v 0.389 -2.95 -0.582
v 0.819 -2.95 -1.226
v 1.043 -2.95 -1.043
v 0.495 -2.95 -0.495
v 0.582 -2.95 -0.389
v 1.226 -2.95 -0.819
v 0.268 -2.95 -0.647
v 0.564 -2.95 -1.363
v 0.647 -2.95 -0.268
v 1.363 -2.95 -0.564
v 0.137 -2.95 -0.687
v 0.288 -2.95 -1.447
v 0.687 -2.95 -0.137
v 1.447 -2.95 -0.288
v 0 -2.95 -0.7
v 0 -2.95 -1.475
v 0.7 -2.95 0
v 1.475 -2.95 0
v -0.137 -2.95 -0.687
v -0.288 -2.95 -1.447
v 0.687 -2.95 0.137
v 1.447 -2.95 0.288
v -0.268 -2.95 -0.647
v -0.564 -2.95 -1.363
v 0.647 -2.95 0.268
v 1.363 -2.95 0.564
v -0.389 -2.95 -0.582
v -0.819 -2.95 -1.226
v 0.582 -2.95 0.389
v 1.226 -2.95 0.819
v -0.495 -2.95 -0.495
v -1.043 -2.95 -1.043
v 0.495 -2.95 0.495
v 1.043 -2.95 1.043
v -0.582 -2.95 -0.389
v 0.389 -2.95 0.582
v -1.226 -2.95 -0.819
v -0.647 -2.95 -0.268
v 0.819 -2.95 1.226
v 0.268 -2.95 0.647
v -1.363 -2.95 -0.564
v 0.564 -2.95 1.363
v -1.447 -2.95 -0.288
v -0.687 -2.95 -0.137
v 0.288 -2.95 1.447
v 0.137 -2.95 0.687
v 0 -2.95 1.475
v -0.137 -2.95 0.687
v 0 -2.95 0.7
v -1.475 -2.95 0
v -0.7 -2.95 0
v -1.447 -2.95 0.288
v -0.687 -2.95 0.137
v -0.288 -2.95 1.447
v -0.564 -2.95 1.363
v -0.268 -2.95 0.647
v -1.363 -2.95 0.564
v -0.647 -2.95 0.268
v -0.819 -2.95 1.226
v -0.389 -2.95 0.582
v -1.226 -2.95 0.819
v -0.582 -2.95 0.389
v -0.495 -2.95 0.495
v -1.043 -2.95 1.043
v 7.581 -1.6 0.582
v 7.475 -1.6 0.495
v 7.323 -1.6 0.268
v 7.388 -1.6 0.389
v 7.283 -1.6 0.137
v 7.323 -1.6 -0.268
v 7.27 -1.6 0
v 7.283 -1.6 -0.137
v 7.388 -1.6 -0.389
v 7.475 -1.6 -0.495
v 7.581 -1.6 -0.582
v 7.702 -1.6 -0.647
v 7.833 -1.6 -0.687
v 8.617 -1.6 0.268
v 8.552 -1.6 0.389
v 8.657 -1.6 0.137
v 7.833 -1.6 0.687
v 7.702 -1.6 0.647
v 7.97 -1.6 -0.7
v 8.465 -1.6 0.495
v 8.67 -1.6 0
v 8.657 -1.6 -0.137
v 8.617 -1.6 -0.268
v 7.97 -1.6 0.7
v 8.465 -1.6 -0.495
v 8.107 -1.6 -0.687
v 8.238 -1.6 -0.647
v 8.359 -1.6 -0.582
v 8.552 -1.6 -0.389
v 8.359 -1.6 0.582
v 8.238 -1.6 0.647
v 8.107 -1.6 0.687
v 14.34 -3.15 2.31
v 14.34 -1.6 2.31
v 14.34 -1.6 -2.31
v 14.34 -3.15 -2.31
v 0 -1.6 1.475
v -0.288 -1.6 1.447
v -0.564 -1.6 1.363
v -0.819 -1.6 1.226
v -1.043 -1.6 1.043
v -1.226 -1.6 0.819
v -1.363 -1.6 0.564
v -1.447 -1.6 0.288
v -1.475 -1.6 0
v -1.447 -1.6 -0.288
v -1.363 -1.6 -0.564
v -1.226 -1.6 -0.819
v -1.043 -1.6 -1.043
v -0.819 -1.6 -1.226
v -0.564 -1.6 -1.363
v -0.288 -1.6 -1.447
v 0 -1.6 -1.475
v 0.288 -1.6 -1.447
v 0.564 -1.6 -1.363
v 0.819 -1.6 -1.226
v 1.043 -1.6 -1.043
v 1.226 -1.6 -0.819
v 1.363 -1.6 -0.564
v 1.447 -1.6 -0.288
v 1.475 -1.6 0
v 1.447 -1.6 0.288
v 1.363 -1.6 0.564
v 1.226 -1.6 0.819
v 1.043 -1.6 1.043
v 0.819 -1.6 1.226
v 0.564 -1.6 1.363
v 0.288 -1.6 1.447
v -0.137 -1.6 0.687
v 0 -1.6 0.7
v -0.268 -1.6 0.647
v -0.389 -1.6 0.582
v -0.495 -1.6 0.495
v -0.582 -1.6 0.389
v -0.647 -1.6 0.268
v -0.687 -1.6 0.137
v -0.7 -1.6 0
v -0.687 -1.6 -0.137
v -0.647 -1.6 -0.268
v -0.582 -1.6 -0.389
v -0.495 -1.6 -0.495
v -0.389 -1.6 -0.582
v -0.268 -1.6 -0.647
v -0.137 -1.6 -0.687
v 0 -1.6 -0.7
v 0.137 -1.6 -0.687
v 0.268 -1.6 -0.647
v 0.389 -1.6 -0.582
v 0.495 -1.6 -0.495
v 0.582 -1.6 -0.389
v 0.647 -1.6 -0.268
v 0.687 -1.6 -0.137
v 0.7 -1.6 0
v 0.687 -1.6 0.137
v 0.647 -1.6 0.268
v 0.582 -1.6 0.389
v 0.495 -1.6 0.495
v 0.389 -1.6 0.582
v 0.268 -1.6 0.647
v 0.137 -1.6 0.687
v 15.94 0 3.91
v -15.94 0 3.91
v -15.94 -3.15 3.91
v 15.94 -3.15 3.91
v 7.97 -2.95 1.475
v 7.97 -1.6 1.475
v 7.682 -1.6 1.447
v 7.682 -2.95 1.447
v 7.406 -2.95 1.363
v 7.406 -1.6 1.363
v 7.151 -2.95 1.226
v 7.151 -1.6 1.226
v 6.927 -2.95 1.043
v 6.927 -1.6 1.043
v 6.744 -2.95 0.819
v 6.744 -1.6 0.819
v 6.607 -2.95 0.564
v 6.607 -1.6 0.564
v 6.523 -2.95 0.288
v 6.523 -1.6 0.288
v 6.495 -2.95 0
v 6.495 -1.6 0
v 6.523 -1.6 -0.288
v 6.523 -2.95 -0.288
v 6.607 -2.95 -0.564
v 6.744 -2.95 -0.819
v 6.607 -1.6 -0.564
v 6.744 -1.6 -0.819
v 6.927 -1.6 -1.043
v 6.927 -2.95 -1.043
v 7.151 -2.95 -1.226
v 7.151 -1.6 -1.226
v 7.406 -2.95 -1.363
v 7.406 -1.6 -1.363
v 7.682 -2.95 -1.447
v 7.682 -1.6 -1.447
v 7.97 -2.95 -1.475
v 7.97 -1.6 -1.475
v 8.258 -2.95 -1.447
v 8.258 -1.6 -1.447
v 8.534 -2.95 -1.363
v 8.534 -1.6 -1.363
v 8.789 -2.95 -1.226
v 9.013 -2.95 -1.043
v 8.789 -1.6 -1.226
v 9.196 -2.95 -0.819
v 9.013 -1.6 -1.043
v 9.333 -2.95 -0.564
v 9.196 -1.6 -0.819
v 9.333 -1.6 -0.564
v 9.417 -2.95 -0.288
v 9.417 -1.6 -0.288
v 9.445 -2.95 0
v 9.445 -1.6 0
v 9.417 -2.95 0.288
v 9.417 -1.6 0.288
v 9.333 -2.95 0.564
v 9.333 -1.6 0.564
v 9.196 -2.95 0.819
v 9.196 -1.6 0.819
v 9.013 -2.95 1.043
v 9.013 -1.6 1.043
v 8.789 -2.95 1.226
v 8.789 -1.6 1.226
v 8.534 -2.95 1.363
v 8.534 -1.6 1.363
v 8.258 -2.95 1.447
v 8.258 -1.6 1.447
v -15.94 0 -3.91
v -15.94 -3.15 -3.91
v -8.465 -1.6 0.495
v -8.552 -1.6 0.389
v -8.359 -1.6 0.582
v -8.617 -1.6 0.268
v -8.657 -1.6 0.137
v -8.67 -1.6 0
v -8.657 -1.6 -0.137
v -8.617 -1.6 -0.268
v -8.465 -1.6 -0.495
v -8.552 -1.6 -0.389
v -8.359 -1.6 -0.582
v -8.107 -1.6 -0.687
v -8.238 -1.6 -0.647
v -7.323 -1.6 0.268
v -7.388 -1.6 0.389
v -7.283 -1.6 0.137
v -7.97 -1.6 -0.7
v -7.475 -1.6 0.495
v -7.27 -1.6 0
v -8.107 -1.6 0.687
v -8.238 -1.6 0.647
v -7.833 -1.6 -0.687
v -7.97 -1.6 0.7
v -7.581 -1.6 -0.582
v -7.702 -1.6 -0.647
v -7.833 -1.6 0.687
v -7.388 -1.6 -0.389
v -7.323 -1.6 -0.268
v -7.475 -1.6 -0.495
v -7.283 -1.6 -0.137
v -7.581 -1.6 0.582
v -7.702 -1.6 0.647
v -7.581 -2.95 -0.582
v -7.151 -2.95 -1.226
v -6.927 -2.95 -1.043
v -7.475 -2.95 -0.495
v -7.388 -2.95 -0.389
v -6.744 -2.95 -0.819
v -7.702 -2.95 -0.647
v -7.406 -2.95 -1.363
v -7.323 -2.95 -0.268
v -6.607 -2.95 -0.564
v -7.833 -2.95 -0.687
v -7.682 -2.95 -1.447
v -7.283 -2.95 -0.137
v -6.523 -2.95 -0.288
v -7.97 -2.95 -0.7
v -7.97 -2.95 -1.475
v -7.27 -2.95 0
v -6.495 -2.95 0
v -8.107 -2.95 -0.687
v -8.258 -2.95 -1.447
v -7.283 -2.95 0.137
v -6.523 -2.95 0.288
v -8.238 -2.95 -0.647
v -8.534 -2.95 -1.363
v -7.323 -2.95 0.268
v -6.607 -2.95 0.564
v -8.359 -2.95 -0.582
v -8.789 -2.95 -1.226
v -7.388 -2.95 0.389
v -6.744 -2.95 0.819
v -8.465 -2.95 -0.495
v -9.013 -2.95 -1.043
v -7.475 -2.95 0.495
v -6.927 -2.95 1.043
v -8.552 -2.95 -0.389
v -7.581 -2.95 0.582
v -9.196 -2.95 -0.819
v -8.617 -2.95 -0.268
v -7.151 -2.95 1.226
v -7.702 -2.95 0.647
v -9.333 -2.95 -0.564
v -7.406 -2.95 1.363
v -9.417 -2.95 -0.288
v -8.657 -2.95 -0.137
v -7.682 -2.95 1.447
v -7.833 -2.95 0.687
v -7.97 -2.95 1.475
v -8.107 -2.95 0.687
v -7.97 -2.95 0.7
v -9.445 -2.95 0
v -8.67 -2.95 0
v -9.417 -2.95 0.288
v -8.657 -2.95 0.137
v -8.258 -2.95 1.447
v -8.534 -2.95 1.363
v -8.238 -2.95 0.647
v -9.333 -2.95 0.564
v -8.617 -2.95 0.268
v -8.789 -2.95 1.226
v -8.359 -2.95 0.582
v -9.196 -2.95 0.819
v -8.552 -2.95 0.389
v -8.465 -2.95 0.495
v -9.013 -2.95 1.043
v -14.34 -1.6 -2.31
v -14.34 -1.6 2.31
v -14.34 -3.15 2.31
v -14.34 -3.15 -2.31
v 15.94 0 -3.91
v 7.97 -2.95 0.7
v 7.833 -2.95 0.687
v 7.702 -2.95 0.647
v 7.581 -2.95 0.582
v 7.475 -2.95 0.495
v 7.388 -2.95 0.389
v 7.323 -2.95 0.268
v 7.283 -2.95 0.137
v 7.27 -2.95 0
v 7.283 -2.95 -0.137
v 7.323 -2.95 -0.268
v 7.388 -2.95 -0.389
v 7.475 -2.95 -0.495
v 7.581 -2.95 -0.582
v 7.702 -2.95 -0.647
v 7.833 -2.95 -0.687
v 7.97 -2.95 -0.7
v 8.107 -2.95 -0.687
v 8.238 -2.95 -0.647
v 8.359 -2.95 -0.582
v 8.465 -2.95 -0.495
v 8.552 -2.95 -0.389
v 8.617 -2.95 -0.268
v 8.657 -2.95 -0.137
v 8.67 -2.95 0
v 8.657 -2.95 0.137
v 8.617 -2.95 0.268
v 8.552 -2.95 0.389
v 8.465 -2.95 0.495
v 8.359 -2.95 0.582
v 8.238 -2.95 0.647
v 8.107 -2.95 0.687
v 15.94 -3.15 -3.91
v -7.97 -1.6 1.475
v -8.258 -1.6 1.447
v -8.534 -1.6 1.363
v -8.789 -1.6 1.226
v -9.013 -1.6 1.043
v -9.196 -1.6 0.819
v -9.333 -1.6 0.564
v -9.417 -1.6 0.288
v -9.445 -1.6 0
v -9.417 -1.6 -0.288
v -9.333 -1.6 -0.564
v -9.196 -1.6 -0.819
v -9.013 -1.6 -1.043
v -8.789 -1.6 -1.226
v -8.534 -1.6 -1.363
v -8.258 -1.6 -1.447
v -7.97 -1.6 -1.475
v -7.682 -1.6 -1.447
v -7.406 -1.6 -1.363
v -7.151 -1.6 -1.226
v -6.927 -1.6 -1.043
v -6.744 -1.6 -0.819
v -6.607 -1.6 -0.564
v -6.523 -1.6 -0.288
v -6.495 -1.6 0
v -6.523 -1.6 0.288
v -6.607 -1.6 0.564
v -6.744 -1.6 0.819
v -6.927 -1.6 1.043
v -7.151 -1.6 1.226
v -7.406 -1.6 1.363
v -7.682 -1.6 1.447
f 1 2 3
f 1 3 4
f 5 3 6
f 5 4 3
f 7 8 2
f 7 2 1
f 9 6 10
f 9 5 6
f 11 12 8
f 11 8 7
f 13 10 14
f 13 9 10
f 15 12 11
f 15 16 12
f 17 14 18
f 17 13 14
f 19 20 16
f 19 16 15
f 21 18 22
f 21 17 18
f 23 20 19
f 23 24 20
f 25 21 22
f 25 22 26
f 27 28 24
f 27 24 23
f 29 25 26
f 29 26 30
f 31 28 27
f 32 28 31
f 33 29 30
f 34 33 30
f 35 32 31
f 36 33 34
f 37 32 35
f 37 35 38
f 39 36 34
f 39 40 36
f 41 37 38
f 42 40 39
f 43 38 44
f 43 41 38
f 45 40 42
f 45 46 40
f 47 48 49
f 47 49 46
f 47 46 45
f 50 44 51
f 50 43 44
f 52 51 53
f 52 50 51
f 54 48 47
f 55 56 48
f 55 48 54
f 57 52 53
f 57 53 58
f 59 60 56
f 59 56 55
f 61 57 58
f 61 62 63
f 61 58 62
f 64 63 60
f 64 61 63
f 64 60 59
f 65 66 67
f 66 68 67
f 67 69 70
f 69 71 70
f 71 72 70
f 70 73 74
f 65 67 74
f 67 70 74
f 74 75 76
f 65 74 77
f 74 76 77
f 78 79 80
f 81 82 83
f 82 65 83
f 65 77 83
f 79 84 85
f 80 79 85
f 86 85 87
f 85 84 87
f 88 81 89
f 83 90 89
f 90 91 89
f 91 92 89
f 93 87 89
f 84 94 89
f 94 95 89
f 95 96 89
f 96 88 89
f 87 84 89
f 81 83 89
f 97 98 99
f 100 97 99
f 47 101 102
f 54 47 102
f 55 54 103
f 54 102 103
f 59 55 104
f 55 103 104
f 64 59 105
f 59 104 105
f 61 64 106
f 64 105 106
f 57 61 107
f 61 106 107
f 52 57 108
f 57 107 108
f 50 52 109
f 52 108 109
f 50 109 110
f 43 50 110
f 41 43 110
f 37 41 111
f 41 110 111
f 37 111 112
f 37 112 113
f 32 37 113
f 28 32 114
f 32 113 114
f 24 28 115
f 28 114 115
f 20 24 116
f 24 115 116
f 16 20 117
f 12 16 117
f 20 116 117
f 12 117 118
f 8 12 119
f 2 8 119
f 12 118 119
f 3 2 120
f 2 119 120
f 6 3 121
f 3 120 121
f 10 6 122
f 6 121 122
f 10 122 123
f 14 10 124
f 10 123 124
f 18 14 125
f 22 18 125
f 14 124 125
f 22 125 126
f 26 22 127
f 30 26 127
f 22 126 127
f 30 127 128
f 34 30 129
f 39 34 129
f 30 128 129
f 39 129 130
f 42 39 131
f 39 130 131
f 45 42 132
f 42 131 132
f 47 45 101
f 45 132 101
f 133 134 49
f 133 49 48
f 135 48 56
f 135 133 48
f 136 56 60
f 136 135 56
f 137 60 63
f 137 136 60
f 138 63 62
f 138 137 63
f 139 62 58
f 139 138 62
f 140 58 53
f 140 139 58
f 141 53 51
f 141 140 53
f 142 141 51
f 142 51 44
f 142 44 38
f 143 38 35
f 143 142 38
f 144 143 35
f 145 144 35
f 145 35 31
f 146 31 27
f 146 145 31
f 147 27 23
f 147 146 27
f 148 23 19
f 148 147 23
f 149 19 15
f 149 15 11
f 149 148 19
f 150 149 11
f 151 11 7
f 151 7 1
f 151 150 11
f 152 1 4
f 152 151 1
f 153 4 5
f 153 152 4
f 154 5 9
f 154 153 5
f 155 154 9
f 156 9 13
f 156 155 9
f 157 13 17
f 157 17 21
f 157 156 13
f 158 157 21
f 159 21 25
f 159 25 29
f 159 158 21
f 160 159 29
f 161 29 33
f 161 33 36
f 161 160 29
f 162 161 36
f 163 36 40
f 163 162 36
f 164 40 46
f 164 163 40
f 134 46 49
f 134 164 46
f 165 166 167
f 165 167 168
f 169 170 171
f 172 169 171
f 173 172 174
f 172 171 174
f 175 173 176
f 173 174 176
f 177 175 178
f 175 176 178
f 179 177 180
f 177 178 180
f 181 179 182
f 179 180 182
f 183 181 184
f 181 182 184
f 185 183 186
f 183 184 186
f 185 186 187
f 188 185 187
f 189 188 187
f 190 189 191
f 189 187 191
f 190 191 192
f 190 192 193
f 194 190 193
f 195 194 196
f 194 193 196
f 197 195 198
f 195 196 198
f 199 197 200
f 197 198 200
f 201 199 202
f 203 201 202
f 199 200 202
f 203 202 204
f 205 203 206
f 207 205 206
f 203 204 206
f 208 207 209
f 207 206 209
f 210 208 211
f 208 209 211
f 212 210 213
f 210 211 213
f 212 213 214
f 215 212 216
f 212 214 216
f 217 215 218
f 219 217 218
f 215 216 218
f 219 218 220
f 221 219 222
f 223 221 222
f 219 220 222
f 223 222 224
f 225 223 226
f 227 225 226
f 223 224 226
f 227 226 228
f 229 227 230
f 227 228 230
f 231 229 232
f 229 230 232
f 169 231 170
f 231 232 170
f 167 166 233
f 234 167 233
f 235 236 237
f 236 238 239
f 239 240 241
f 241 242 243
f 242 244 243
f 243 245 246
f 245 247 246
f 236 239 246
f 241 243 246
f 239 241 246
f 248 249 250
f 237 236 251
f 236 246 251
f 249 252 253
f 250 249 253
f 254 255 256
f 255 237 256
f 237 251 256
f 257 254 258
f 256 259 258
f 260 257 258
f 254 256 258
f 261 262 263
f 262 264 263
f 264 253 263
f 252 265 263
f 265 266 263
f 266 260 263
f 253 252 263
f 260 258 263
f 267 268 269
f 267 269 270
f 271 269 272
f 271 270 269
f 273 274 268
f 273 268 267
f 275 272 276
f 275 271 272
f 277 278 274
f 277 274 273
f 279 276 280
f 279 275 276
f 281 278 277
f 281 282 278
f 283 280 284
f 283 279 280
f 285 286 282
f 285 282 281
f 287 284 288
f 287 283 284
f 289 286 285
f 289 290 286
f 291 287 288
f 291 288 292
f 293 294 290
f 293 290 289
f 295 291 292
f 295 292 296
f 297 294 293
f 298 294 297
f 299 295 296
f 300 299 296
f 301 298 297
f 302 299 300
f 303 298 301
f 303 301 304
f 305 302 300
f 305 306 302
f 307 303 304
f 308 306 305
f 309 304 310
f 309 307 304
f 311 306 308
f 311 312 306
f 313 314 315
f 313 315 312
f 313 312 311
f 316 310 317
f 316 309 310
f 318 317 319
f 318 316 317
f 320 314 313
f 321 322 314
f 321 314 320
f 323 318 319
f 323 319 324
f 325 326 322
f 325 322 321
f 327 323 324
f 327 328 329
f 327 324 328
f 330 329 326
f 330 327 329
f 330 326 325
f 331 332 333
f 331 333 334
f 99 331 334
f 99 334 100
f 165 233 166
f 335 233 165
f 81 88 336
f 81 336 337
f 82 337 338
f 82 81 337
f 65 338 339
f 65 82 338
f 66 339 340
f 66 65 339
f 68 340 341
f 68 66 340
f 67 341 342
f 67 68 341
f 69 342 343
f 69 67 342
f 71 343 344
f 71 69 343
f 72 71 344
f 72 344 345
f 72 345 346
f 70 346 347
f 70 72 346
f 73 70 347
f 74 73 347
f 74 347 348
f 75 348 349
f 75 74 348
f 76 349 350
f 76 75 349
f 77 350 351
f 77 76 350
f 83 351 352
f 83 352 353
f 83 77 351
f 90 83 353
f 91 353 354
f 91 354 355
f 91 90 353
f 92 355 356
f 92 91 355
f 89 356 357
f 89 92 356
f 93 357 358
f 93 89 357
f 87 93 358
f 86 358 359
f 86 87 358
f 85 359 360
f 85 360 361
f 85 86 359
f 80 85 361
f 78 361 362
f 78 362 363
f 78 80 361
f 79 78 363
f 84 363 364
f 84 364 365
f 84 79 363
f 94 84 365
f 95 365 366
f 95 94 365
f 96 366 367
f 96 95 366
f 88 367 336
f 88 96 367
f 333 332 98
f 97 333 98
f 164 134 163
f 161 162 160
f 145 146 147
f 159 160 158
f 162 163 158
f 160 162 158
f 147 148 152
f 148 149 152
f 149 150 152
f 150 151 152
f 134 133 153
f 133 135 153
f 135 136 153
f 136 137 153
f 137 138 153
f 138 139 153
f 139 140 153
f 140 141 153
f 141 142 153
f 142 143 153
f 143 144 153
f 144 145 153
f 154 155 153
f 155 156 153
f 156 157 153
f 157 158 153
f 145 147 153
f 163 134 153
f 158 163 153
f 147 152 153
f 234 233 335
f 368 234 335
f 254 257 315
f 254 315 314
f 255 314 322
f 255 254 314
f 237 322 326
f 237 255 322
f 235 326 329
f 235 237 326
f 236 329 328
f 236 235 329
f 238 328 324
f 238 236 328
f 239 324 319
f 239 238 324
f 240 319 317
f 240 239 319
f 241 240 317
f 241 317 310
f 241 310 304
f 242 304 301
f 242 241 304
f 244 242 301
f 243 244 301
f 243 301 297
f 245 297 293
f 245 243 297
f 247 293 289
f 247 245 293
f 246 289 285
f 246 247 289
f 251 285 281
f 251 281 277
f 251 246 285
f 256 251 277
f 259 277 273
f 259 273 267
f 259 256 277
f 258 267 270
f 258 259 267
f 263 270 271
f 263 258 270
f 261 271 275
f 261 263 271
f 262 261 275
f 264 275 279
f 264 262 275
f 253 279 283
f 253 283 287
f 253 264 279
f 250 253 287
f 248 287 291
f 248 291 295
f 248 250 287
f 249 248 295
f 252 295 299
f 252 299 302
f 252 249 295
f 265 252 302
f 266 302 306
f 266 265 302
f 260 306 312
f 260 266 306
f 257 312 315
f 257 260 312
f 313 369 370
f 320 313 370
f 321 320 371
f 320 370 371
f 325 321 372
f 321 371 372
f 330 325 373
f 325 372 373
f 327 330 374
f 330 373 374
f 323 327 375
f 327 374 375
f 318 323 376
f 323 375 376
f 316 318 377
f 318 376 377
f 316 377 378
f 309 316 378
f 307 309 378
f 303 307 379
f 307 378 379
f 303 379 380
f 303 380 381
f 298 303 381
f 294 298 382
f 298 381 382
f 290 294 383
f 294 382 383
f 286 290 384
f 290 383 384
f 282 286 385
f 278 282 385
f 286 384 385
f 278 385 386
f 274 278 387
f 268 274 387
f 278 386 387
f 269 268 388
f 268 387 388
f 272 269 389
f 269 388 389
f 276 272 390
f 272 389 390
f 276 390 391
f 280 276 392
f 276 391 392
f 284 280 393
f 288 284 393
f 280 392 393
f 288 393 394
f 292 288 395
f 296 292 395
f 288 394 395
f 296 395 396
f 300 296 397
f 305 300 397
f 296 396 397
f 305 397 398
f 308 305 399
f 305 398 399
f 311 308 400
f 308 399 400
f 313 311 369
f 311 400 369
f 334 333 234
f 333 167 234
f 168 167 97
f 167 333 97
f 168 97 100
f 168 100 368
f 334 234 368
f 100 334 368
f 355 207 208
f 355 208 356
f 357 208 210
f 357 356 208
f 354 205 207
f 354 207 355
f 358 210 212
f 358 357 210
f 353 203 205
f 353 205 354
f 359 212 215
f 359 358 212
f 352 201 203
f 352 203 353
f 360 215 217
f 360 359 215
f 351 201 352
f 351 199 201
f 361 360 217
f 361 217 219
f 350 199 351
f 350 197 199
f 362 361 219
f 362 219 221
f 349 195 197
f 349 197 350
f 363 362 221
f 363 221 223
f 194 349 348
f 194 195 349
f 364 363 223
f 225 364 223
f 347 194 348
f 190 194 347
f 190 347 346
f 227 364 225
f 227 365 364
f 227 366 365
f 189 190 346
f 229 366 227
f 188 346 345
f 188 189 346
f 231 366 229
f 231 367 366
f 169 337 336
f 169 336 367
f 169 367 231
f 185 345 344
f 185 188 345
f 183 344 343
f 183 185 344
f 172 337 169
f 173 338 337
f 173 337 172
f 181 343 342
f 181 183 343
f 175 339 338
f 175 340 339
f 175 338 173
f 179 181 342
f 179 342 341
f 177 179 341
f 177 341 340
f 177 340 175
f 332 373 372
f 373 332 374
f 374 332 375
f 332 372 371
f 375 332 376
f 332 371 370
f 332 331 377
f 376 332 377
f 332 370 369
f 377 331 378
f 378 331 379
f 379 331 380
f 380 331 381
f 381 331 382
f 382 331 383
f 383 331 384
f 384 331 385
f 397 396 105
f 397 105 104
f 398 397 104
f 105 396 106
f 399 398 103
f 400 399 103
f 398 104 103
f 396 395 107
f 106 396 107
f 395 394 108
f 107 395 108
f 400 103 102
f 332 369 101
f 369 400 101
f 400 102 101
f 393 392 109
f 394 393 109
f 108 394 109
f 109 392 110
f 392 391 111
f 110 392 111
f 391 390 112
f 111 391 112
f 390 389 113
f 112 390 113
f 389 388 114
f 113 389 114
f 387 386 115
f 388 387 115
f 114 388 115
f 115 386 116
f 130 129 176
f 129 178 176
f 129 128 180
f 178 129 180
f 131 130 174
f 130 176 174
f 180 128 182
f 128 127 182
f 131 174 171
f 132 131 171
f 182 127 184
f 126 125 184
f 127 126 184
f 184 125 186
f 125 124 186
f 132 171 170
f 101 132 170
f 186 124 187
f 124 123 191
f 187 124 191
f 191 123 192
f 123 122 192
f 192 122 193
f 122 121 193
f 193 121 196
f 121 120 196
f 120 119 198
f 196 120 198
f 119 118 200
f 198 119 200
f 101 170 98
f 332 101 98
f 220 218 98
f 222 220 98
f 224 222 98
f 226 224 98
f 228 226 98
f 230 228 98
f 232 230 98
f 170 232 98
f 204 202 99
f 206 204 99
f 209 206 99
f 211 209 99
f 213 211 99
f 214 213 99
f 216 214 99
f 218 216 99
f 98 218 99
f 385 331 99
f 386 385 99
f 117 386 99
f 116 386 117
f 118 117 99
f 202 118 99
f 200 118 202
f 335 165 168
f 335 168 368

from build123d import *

# Parameters (mm, degrees)
SKETCH1_W           = 31.88
SKETCH1_H           = 7.82
BOSS_EXTRUDE1_DEPTH = 3.15
SHELL1_T            = -1.6
SKETCH2_R           = 1.475
SKETCH2_R_2         = 0.7
BOSS_EXTRUDE2_DEPTH = 1.35


with BuildPart() as part:
    # Sketch1 → Boss-Extrude1 (new body)
    with BuildSketch(Plane(origin=(0, 0, 0), x_dir=(1, 0, 0), z_dir=(0, 1, 0))):
        Rectangle(SKETCH1_W, SKETCH1_H)
    extrude(amount=-BOSS_EXTRUDE1_DEPTH)

    # Shell1
    shell1_openings = [part.faces().sort_by_distance(p)[0] for p in [
        (0, -3.15, 0),
    ]]
    offset(amount=SHELL1_T, openings=shell1_openings, kind=Kind.INTERSECTION)

    # Sketch2 → Boss-Extrude2 (add)
    # profile 1 of 3: a face of its own
    with BuildSketch(Plane.XZ.offset(1.6)):
        with Locations(Location((-7.97, 0, 0), (0, 0, 90))):
            Circle(SKETCH2_R)
        with Locations(Location((-7.97, 0, 0), (0, 0, 90))):
            Circle(SKETCH2_R_2, mode=Mode.SUBTRACT)
    # profile 2 of 3: a face of its own
    with BuildSketch(Plane.XZ.offset(1.6)):
        with Locations(Location((0, 0, 0), (0, 0, 90))):
            Circle(SKETCH2_R)
        with Locations(Location((0, 0, 0), (0, 0, 90))):
            Circle(SKETCH2_R_2, mode=Mode.SUBTRACT)
    # profile 3 of 3: a face of its own
    with BuildSketch(Plane.XZ.offset(1.6)):
        with Locations(Location((7.97, 0, 0), (0, 0, 90))):
            Circle(SKETCH2_R)
        with Locations(Location((7.97, 0, 0), (0, 0, 90))):
            Circle(SKETCH2_R_2, mode=Mode.SUBTRACT)
    extrude(amount=BOSS_EXTRUDE2_DEPTH)


solid = part.part
